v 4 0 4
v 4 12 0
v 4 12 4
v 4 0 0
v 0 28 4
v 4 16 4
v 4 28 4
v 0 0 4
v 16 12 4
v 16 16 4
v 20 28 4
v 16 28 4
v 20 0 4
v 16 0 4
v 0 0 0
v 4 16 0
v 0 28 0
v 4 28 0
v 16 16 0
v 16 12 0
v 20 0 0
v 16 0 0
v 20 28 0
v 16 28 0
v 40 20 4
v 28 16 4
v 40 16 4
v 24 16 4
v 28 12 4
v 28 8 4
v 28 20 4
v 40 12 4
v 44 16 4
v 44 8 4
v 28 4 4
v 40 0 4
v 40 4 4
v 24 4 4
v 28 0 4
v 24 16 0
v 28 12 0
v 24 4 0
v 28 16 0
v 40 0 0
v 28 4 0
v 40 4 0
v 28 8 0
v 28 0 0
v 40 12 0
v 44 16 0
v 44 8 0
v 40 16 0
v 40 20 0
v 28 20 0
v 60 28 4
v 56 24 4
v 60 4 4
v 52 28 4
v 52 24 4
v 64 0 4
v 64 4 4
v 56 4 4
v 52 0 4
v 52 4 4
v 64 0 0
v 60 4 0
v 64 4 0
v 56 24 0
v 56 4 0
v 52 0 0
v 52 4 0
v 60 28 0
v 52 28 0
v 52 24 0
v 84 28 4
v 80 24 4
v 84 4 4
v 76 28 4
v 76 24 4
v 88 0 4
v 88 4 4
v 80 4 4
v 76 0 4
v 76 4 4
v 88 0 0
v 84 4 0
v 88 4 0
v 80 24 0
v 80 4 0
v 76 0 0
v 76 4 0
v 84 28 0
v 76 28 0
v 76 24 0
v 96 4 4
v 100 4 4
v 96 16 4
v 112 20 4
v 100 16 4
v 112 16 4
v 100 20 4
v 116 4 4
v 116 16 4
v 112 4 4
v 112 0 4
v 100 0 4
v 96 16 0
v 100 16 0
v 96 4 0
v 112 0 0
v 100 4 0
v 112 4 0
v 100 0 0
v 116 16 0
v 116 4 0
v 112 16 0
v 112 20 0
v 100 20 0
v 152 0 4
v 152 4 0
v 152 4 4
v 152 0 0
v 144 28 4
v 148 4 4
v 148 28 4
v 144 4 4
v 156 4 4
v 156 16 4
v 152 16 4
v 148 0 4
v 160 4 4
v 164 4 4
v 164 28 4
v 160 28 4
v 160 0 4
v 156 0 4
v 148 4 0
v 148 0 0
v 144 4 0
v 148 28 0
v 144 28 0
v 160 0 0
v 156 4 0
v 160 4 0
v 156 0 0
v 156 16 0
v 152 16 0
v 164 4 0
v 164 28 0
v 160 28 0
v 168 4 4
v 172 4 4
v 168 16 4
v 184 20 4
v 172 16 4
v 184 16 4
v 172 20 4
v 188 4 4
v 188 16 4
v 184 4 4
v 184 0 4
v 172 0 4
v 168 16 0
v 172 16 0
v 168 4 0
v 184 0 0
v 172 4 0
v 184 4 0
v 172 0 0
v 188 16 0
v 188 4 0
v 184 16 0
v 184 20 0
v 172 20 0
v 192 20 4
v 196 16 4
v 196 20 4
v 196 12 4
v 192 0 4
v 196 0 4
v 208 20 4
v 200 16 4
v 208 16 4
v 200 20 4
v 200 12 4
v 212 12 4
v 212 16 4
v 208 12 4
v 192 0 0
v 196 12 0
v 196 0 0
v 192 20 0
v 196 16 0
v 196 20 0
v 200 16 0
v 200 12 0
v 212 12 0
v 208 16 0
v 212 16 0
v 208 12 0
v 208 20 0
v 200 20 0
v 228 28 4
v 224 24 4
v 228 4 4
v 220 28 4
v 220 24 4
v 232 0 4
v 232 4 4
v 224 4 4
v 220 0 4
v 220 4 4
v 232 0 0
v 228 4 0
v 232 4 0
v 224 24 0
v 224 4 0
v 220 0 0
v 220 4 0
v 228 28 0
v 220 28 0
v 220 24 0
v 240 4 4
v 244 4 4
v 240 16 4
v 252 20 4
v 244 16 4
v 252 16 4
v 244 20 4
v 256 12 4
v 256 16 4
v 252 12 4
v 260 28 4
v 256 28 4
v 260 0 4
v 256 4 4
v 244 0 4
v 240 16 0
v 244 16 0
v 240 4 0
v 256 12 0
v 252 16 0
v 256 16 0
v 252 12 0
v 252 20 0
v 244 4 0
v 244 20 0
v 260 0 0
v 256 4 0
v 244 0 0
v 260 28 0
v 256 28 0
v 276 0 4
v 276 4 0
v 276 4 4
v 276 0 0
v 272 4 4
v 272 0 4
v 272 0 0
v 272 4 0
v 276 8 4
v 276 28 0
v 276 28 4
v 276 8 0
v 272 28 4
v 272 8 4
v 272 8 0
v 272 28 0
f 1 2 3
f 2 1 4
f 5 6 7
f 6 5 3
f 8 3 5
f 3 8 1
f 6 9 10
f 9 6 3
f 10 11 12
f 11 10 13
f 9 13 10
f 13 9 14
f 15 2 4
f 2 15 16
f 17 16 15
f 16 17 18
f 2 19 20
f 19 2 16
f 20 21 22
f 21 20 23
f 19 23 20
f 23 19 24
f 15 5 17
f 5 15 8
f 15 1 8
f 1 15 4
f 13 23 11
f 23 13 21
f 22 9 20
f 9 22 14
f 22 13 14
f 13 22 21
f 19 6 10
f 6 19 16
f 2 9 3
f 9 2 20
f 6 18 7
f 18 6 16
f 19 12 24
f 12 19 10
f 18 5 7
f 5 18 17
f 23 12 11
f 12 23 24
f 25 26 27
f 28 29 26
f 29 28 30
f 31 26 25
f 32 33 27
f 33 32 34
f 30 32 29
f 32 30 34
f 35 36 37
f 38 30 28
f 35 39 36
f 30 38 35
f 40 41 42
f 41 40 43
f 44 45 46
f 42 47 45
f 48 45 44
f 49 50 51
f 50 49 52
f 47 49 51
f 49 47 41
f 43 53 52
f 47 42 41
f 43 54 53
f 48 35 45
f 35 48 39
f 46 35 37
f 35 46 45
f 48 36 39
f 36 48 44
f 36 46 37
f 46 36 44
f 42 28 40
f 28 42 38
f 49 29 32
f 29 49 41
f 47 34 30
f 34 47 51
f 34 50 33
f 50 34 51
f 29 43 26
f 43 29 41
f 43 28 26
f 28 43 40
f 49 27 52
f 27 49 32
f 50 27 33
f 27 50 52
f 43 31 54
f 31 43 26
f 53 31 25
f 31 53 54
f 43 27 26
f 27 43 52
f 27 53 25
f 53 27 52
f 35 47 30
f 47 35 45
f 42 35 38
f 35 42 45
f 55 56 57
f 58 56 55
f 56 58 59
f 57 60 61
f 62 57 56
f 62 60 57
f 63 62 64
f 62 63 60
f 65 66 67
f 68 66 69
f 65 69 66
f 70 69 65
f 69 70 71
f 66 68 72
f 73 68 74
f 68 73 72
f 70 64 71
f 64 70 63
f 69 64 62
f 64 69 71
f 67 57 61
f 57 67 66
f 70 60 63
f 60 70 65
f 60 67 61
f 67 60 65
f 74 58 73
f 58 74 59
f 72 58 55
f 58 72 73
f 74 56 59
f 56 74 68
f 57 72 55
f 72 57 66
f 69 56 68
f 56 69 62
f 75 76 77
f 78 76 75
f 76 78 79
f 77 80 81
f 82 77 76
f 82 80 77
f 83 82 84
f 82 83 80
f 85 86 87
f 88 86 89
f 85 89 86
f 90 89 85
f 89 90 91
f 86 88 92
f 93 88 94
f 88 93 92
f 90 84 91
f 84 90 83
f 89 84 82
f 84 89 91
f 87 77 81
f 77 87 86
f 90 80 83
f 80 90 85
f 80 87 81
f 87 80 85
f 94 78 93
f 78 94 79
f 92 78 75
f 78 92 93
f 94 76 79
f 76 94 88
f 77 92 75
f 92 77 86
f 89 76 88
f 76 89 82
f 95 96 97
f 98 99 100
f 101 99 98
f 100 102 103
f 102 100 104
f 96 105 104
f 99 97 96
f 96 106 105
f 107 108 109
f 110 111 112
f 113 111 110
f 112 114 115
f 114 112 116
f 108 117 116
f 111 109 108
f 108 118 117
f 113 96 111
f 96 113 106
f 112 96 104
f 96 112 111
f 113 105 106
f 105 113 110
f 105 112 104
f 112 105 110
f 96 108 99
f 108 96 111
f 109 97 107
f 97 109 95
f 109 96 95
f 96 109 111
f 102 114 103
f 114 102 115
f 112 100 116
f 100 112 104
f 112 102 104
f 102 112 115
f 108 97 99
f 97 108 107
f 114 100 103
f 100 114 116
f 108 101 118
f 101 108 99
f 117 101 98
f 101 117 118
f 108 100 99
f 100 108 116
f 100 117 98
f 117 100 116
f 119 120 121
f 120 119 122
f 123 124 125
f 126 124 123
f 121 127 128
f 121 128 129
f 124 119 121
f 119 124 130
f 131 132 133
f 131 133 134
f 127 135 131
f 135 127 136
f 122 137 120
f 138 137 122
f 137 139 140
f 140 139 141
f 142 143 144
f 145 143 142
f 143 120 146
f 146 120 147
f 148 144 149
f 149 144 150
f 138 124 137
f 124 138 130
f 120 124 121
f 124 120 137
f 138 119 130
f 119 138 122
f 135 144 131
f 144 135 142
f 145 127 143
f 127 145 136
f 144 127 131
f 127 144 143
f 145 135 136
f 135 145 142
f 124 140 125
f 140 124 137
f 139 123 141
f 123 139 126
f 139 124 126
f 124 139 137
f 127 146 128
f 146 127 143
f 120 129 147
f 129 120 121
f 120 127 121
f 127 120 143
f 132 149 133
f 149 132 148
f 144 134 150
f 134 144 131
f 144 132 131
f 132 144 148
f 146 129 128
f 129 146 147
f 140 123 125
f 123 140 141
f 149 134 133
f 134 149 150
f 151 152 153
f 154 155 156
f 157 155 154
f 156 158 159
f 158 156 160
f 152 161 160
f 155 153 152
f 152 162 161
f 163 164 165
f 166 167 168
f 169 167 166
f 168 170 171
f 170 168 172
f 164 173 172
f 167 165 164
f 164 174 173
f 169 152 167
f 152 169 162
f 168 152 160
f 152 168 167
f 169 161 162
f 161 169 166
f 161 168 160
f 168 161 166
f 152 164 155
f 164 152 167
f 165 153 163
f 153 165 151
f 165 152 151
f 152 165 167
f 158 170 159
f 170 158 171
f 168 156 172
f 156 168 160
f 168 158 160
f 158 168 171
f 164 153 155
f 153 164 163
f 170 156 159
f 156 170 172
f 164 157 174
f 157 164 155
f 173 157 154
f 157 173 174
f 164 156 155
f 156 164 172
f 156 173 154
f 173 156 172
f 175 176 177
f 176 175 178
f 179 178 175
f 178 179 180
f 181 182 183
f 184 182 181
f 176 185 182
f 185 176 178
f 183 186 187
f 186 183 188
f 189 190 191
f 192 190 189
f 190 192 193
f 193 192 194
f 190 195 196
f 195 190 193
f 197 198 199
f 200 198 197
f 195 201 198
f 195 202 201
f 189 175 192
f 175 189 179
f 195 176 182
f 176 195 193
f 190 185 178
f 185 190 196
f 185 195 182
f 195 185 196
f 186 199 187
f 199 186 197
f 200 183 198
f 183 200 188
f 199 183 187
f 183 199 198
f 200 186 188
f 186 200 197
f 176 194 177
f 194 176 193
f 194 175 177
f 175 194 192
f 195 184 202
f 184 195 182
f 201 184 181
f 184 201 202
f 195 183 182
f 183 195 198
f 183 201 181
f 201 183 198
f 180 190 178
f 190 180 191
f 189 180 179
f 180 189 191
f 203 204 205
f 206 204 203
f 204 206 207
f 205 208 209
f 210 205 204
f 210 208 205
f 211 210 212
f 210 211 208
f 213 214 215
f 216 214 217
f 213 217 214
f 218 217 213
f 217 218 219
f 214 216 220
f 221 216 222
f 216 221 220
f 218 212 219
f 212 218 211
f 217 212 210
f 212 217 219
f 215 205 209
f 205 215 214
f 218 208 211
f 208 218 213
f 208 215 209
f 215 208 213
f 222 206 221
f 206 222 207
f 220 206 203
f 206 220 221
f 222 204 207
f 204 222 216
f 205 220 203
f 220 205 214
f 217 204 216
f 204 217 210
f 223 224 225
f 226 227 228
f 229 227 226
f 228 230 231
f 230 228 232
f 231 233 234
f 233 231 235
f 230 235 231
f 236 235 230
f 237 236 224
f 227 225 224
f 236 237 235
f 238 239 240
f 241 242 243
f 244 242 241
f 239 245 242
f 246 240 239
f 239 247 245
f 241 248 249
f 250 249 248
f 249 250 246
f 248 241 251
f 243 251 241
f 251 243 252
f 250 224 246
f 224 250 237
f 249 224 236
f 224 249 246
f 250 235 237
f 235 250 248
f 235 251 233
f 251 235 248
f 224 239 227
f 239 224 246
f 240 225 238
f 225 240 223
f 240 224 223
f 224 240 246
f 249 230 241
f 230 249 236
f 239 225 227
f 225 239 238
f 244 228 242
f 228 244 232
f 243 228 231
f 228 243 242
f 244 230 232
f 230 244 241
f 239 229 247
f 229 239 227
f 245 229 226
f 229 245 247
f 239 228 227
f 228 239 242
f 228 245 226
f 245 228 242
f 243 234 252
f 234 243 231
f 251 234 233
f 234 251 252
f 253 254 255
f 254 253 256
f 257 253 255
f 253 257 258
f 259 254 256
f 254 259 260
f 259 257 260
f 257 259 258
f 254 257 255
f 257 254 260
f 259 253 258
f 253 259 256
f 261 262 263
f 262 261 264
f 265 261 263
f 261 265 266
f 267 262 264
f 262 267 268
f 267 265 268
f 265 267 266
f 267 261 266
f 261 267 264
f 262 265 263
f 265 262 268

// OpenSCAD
// @url https://www.thingiverse.com/thing:59817

//Draw text
scale([4,4,4]) drawtext("Hello World!");

//Draw character set
//scale([2,2,2]) drawtext(" !\"#$%&'()*+,-./0123456789:;<=>?@ABCDEFGHIJKLMNOPQRSTUVWXYZ[\\]^_`abcdefghijklmnopqrstuvwxyz{|}");

module drawtext(text) {
	//Characters
	chars = " !\"#$%&'()*+,-./0123456789:;<=>?@ABCDEFGHIJKLMNOPQRSTUVWXYZ[\\]^_`abcdefghijklmnopqrstuvwxyz{|}";

	//Chracter table defining 5x7 characters
	//Adapted from: http://www.geocities.com/dinceraydin/djlcdsim/chartable.js
	char_table = [ [ 0, 0, 0, 0, 0, 0, 0],
                  [ 4, 0, 4, 4, 4, 4, 4],
                  [ 0, 0, 0, 0,10,10,10],
                  [10,10,31,10,31,10,10],
                  [ 4,30, 5,14,20,15, 4],
                  [ 3,19, 8, 4, 2,25,24],
                  [13,18,21, 8,20,18,12],
                  [ 0, 0, 0, 0, 8, 4,12],
                  [ 2, 4, 8, 8, 8, 4, 2],
                  [ 8, 4, 2, 2, 2, 4, 8],
                  [ 0, 4,21,14,21, 4, 0],
                  [ 0, 4, 4,31, 4, 4, 0],
                  [ 8, 4,12, 0, 0, 0, 0],
                  [ 0, 0, 0,31, 0, 0, 0],
                  [12,12, 0, 0, 0, 0, 0],
                  [ 0,16, 8, 4, 2, 1, 0],
                  [14,17,25,21,19,17,14],
                  [14, 4, 4, 4, 4,12, 4],
                  [31, 8, 4, 2, 1,17,14],
                  [14,17, 1, 2, 4, 2,31],
                  [ 2, 2,31,18,10, 6, 2],
                  [14,17, 1, 1,30,16,31],
                  [14,17,17,30,16, 8, 6],
                  [ 8, 8, 8, 4, 2, 1,31],
                  [14,17,17,14,17,17,14],
                  [12, 2, 1,15,17,17,14],
                  [ 0,12,12, 0,12,12, 0],
                  [ 8, 4,12, 0,12,12, 0],
                  [ 2, 4, 8,16, 8, 4, 2],
                  [ 0, 0,31, 0,31, 0, 0],
                  [16, 8, 4, 2, 4, 8,16],
                  [ 4, 0, 4, 2, 1,17,14],
                  [14,21,21,13, 1,17,14],
                  [17,17,31,17,17,17,14],
                  [30,17,17,30,17,17,30],
                  [14,17,16,16,16,17,14],
                  [30,17,17,17,17,17,30],
                  [31,16,16,30,16,16,31],
                  [16,16,16,30,16,16,31],
                  [15,17,17,23,16,17,14],
                  [17,17,17,31,17,17,17],
                  [14, 4, 4, 4, 4, 4,14],
                  [12,18, 2, 2, 2, 2, 7],
                  [17,18,20,24,20,18,17],
                  [31,16,16,16,16,16,16],
                  [17,17,17,21,21,27,17],
                  [17,17,19,21,25,17,17],
                  [14,17,17,17,17,17,14],
                  [16,16,16,30,17,17,30],
                  [13,18,21,17,17,17,14],
                  [17,18,20,30,17,17,30],
                  [30, 1, 1,14,16,16,15],
                  [ 4, 4, 4, 4, 4, 4,31],
                  [14,17,17,17,17,17,17],
                  [ 4,10,17,17,17,17,17],
                  [10,21,21,21,17,17,17],
                  [17,17,10, 4,10,17,17],
                  [ 4, 4, 4,10,17,17,17],
                  [31,16, 8, 4, 2, 1,31],
                  [14, 8, 8, 8, 8, 8,14],
                  [ 0, 1, 2, 4, 8,16, 0],
                  [14, 2, 2, 2, 2, 2,14],
                  [ 0, 0, 0, 0,17,10, 4],
                  [31, 0, 0, 0, 0, 0, 0],
                  [ 0, 0, 0, 0, 2, 4, 8],
                  [15,17,15, 1,14, 0, 0],
                  [30,17,17,25,22,16,16],
                  [14,17,16,16,14, 0, 0],
                  [15,17,17,19,13, 1, 1],
                  [14,16,31,17,14, 0, 0],
                  [ 8, 8, 8,28, 8, 9, 6],
                  [14, 1,15,17,15, 0, 0],
                  [17,17,17,25,22,16,16],
                  [14, 4, 4, 4,12, 0, 4],
                  [12,18, 2, 2, 2, 6, 2],
                  [18,20,24,20,18,16,16],
                  [14, 4, 4, 4, 4, 4,12],
                  [17,17,21,21,26, 0, 0],
                  [17,17,17,25,22, 0, 0],
                  [14,17,17,17,14, 0, 0],
                  [16,16,30,17,30, 0, 0],
                  [ 1, 1,15,19,13, 0, 0],
                  [16,16,16,25,22, 0, 0],
                  [30, 1,14,16,15, 0, 0],
                  [ 6, 9, 8, 8,28, 8, 8],
                  [13,19,17,17,17, 0, 0],
                  [ 4,10,17,17,17, 0, 0],
                  [10,21,21,17,17, 0, 0],
                  [17,10, 4,10,17, 0, 0],
                  [14, 1,15,17,17, 0, 0],
                  [31, 8, 4, 2,31, 0, 0],
                  [ 2, 4, 4, 8, 4, 4, 2],
                  [ 4, 4, 4, 4, 4, 4, 4],
                  [ 8, 4, 4, 2, 4, 4, 8] ];

	//Binary decode table
	dec_table = [ "00000", "00001", "00010", "00011", "00100", "00101",
  	            "00110", "00111", "01000", "01001", "01010", "01011",
  	            "01100", "01101", "01110", "01111", "10000", "10001",
  	            "10010", "10011", "10100", "10101", "10110", "10111",
	            "11000", "11001", "11010", "11011", "11100", "11101",
	            "11110", "11111" ];

	//Process string one character at a time
	for(itext = [0:len(text)-1]) {
		//Convert character to index
		assign(ichar = search(text[itext],chars,1)[0]) {
			//Decode character - rows
			for(irow = [0:6]) {
				assign(val = dec_table[char_table[ichar][irow]]) {
					//Decode character - cols
					for(icol = [0:4]) {
						assign(bit = search(val[icol],"01",1)[0]) {
							if(bit) {
								//Output cube
								translate([icol + (6*itext), irow, 0])
									cube([1.0001,1.0001,1]);
							}
						}
					}
				}
			}
		}
	}
}
